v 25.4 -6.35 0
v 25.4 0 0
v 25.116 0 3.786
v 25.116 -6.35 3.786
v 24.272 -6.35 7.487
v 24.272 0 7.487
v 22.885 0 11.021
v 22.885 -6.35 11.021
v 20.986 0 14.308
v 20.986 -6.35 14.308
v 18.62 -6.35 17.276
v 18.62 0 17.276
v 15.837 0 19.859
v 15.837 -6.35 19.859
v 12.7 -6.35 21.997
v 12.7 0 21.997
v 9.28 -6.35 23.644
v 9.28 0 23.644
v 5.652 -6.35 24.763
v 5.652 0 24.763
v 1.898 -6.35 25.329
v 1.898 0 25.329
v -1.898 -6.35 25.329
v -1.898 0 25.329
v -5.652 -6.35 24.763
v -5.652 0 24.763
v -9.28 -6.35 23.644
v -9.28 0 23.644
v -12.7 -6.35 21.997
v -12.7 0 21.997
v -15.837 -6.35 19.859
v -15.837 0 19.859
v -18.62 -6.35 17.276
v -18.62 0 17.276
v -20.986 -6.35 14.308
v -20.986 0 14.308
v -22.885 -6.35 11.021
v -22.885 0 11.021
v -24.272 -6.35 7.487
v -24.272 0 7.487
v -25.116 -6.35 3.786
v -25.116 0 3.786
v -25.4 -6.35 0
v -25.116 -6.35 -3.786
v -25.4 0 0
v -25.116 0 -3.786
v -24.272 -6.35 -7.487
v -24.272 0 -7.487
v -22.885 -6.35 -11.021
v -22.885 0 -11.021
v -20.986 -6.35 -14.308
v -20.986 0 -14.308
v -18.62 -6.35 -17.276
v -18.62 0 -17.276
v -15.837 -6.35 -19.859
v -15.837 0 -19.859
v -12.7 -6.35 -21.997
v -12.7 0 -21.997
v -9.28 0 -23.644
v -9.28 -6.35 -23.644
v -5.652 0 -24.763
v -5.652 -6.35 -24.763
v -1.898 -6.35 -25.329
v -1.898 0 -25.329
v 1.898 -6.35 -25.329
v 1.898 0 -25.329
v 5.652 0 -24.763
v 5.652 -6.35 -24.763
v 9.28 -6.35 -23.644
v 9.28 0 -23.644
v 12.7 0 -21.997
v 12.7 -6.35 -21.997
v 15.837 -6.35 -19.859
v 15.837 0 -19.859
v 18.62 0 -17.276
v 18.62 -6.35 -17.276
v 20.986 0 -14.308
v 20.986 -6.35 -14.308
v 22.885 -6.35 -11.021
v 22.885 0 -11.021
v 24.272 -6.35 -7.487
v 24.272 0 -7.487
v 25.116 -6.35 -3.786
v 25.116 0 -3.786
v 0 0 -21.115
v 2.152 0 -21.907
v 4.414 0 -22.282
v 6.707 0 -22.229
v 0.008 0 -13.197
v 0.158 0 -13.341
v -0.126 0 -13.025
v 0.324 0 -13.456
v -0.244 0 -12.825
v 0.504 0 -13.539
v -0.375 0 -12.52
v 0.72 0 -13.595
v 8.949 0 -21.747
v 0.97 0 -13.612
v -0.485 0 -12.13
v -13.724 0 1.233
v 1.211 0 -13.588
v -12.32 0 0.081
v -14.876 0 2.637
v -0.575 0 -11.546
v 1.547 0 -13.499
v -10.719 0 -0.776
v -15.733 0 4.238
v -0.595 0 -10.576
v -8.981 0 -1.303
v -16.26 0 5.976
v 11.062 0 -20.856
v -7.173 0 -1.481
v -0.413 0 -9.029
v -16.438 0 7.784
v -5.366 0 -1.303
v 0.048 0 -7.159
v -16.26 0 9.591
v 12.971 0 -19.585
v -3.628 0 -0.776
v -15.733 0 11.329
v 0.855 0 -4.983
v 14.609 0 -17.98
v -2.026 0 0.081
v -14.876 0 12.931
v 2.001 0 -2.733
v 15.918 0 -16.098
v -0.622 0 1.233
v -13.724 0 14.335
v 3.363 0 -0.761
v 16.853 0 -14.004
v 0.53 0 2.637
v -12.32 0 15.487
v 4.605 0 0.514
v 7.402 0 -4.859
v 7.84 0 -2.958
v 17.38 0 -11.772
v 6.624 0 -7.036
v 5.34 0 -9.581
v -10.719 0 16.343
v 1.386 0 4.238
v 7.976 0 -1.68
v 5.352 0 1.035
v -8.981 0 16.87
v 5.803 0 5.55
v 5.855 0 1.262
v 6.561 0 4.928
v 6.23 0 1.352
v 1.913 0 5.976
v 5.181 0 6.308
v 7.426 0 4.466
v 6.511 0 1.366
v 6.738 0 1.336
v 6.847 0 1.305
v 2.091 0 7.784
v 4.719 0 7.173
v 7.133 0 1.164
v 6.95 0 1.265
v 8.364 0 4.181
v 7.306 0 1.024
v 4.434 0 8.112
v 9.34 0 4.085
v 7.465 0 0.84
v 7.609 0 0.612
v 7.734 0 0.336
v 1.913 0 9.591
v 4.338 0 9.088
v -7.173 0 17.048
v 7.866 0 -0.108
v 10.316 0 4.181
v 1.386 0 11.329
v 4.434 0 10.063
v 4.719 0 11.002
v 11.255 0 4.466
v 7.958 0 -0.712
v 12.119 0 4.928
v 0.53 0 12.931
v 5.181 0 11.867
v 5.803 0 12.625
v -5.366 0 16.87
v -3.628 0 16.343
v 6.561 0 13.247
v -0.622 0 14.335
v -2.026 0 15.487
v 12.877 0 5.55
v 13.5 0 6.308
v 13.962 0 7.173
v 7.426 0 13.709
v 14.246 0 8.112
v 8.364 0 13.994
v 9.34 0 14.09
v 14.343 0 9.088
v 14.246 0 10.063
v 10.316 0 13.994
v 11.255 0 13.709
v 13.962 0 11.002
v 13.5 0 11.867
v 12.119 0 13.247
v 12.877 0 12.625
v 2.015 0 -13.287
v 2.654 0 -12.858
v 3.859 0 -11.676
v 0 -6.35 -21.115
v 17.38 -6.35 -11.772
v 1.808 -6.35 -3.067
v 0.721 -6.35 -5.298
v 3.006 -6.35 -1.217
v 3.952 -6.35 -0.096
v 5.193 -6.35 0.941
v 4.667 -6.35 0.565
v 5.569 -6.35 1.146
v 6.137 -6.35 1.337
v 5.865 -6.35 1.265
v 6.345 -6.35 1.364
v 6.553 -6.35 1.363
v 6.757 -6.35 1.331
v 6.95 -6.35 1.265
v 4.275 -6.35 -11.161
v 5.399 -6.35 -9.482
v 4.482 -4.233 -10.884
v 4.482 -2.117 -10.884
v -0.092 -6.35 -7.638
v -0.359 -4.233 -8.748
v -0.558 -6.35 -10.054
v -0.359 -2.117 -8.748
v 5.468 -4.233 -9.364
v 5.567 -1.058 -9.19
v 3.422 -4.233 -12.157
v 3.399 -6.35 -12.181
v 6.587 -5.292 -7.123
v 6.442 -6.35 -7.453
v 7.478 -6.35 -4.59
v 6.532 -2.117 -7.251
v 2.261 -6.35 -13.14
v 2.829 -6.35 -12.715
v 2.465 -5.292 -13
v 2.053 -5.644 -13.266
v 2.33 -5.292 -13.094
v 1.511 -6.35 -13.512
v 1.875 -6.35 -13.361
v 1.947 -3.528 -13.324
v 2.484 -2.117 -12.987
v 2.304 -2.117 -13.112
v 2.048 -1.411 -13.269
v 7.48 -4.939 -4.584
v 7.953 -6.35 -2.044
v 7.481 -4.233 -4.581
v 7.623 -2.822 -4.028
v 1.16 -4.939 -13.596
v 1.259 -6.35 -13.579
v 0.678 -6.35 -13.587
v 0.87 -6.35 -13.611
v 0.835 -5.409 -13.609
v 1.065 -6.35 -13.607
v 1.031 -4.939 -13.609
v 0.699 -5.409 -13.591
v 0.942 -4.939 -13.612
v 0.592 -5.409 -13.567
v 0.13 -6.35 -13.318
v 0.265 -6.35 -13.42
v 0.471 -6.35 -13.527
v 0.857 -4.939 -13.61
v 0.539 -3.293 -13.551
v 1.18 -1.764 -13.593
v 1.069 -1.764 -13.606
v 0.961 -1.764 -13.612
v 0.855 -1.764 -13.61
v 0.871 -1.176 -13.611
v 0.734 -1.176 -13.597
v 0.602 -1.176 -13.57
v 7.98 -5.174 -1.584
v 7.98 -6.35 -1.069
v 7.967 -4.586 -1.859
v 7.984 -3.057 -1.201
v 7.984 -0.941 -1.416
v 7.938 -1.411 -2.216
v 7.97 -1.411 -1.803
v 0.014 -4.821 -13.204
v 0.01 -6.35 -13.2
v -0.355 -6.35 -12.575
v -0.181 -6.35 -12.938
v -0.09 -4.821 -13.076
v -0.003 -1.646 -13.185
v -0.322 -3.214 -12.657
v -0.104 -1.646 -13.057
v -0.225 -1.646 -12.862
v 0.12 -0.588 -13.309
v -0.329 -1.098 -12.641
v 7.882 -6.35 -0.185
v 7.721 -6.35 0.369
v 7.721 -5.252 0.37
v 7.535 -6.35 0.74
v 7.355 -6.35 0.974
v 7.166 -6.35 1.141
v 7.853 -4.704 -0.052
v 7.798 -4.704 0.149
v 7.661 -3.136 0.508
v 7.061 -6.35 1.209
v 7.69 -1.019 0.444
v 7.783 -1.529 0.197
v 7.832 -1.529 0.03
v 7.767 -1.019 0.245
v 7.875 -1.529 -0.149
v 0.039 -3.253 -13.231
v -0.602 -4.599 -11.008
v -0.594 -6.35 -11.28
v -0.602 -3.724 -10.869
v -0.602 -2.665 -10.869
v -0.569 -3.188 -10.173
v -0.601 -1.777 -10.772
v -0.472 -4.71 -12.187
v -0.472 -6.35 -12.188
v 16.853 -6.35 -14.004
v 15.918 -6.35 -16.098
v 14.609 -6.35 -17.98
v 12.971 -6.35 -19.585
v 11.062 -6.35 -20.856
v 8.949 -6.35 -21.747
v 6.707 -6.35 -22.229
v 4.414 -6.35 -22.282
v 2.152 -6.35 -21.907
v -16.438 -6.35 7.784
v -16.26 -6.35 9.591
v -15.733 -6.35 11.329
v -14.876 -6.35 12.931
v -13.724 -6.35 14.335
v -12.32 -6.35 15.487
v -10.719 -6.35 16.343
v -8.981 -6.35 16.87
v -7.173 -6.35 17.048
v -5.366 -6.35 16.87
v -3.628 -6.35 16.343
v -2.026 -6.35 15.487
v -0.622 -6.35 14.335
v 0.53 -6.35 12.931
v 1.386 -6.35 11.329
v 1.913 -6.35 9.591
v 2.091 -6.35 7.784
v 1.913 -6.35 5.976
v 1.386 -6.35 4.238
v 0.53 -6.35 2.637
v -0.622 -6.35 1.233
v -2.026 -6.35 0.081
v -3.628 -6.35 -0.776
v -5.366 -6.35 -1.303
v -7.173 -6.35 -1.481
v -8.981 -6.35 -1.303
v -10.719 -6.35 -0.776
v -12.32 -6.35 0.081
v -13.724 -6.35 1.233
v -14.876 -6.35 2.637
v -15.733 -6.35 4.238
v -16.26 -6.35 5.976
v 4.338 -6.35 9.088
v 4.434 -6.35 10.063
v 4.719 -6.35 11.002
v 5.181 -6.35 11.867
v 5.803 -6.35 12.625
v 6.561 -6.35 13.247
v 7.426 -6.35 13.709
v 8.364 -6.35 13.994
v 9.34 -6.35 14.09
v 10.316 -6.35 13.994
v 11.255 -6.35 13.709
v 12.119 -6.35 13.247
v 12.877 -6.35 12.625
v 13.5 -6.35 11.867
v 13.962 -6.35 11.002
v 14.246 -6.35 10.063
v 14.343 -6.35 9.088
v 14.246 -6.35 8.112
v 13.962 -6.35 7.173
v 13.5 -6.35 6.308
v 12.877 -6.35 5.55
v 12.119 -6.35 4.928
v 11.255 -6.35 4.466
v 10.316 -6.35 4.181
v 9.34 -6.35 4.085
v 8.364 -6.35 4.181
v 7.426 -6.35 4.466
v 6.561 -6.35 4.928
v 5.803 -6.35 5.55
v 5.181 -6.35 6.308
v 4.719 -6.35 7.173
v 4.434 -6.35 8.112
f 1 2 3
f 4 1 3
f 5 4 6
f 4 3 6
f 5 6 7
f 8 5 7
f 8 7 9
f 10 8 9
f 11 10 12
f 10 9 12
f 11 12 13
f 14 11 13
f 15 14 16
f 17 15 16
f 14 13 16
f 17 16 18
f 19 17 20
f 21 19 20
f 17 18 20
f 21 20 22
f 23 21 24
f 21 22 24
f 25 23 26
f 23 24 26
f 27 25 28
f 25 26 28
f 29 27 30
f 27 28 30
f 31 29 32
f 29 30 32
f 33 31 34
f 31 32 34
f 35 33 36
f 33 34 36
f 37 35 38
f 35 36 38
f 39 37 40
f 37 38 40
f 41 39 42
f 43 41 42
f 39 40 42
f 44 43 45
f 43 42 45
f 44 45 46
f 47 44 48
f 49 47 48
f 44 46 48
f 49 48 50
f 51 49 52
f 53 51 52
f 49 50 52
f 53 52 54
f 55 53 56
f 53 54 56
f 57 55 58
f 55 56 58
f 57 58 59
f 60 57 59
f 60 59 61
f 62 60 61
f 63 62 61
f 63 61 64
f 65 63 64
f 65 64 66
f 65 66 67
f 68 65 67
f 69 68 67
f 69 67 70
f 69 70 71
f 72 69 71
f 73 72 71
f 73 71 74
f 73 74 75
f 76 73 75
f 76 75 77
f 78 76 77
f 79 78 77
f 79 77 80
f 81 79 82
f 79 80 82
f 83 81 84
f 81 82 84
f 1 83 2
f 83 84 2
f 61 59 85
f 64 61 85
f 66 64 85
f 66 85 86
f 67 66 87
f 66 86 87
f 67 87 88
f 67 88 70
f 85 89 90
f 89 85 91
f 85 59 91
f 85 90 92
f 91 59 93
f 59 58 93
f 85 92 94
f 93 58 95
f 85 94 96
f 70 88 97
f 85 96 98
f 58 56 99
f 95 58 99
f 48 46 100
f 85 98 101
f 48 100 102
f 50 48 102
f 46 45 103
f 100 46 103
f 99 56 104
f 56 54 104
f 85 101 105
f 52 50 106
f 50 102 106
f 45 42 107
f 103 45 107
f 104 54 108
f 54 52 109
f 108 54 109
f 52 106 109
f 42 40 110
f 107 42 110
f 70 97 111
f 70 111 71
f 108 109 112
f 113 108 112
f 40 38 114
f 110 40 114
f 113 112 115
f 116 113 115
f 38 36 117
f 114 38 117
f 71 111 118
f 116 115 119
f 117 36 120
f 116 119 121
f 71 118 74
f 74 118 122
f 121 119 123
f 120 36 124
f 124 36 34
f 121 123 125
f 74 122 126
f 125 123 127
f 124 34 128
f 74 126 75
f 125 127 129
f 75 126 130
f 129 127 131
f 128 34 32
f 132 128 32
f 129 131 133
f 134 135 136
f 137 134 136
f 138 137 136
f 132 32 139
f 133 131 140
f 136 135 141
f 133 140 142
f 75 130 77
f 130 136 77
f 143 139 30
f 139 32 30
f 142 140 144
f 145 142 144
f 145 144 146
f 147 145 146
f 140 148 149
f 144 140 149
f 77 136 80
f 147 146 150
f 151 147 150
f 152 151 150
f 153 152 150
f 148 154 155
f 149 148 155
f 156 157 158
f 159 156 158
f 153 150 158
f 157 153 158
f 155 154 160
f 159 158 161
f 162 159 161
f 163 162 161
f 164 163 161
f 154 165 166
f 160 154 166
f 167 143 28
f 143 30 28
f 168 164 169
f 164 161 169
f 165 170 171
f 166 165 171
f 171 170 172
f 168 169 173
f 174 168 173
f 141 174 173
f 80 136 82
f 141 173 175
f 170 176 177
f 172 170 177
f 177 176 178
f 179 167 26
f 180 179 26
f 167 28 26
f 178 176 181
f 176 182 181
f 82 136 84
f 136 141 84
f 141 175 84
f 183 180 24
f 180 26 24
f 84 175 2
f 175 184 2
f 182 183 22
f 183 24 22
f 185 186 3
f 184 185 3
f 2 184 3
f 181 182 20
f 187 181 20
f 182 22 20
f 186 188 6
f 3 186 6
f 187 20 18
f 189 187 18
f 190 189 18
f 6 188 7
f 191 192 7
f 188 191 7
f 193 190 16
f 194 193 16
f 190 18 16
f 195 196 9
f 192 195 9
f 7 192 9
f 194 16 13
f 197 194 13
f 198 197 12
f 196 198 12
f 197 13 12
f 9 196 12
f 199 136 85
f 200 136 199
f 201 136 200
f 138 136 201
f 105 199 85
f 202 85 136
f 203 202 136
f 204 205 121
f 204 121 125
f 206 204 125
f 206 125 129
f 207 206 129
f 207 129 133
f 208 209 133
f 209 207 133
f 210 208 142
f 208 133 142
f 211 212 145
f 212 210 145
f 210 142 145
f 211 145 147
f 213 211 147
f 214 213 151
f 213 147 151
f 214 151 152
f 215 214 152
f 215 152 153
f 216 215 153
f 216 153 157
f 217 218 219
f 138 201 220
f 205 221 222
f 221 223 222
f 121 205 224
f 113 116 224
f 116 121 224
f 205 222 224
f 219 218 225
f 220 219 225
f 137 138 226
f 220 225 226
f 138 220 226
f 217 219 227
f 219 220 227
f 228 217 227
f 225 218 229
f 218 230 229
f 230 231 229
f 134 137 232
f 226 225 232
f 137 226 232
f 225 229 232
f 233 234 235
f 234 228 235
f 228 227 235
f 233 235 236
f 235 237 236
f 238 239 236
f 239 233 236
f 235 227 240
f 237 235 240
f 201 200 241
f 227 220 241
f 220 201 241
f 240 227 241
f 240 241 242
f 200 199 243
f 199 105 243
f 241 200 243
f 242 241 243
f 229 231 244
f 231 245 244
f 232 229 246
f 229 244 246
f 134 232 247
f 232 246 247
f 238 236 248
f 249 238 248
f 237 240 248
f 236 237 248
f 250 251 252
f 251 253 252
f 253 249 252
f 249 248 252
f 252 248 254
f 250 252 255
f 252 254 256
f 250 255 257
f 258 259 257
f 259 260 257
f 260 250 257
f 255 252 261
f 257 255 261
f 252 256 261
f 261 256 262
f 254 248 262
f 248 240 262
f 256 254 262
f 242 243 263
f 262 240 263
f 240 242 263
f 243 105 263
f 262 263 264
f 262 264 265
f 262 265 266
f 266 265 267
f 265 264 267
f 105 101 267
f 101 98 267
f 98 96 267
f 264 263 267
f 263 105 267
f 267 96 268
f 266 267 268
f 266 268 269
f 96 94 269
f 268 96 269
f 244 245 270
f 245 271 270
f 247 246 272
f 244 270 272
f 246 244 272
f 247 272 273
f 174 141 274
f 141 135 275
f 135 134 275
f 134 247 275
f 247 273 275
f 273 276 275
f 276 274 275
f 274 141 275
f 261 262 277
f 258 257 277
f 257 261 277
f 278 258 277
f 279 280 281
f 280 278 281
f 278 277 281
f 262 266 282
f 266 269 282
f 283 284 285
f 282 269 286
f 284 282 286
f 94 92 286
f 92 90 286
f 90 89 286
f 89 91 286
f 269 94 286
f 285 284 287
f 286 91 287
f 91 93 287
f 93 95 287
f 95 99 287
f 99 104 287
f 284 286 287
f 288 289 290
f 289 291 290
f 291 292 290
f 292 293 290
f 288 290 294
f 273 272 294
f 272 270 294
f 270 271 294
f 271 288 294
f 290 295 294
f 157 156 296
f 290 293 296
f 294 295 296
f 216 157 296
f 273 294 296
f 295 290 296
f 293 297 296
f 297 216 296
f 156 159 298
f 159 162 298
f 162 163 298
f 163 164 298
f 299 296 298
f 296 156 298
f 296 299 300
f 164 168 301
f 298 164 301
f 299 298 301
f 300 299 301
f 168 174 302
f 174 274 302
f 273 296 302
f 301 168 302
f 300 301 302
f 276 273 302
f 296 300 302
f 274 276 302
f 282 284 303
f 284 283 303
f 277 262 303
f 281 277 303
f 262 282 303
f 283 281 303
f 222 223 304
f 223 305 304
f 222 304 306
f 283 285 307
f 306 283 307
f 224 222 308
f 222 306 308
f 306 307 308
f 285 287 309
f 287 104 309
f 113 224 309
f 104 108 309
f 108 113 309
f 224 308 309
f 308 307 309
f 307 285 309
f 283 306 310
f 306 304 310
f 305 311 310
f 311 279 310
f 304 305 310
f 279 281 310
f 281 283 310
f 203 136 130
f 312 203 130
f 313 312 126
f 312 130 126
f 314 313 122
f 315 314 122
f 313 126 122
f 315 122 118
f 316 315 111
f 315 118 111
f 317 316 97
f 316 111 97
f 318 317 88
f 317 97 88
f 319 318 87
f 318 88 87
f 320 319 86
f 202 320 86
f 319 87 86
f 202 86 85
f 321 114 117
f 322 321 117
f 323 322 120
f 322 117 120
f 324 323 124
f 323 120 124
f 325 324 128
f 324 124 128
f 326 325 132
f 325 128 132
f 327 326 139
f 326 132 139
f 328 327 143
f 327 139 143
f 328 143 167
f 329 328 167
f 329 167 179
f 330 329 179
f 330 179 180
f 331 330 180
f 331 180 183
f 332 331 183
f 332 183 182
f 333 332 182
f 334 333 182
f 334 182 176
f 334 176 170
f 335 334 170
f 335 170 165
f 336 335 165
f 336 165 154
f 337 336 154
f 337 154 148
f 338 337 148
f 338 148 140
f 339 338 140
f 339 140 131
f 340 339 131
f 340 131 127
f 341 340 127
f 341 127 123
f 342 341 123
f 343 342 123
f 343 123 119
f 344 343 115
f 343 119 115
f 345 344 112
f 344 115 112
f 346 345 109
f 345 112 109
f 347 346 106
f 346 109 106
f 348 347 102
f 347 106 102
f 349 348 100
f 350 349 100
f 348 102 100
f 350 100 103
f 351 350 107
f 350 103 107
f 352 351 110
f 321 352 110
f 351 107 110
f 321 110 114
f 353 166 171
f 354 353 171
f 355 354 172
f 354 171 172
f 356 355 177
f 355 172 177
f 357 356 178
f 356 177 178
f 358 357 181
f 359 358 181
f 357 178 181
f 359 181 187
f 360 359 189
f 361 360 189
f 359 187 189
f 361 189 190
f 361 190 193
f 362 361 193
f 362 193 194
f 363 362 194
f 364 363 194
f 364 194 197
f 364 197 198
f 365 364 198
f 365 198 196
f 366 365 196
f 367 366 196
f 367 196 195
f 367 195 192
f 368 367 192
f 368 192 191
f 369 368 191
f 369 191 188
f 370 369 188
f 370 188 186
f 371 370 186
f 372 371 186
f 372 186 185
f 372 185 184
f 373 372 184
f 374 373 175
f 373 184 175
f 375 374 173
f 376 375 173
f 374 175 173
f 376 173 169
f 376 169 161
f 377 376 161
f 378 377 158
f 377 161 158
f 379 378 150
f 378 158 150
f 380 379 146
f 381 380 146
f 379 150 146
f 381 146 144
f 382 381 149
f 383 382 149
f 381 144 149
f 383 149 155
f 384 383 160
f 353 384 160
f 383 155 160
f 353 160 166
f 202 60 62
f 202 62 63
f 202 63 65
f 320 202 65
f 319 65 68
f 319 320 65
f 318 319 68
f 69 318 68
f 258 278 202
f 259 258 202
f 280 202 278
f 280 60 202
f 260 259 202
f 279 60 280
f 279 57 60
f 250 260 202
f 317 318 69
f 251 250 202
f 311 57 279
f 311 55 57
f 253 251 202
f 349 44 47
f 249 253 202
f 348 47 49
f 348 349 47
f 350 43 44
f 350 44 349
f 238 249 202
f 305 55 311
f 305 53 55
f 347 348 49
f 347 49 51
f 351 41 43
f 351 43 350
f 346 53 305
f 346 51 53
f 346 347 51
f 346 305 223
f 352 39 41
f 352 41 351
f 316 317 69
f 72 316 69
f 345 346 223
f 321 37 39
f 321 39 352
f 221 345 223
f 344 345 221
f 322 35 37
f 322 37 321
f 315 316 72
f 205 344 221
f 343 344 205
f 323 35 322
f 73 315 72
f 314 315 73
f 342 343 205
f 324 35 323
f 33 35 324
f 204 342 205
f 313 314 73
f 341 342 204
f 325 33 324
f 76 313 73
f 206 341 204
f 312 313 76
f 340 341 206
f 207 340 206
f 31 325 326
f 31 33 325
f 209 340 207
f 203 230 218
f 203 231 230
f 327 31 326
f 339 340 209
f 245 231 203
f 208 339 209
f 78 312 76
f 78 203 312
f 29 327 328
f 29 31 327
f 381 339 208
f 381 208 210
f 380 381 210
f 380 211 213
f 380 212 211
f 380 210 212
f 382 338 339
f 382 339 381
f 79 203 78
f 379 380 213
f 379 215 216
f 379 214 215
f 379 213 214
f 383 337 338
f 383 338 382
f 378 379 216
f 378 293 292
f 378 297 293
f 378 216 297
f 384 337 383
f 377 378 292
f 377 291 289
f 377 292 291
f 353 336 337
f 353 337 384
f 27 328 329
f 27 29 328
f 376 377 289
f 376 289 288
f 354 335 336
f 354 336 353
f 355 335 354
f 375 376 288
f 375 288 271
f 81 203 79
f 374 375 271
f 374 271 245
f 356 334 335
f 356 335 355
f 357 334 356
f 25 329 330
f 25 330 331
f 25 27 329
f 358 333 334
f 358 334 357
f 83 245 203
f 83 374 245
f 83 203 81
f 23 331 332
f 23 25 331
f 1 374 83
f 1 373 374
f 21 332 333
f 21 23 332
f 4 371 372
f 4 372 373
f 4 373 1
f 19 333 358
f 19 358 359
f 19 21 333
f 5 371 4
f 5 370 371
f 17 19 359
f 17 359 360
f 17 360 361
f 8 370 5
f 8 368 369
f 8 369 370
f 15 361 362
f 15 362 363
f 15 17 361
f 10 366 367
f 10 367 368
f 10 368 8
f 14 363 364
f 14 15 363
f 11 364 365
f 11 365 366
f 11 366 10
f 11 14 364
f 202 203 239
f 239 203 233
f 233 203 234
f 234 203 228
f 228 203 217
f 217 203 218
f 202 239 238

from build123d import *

# Parameters (mm, degrees)
F0_R     = 25.4
F1_DEPTH = 6.35
F2_R     = 5.0022521094
F2_R_2   = 9.2645571297
F3_DEPTH = 304.8


with BuildPart() as f1:
    # F0 (on Front) → F1 (new body)
    with BuildSketch(Plane.XZ):
        Circle(F0_R)
    extrude(amount=F1_DEPTH)

    # F2 (on face) → F3 (cut)
    with BuildSketch(Plane(origin=(0, 0, 0), x_dir=(-1, 0, 0), z_dir=(0, 1, 0))):
        with Locations((-9.3403114006, 9.0875271708)):
            Circle(F2_R)
        with Locations((7.1732723154, 7.7838213183)):
            Circle(F2_R_2)
        with BuildLine():
            add(Edge.make_bspline(
                [(-6.9501879625, 1.2653029989), (-11.791334102, -0.8704968986), (-4.4818707212, -10.8840809798), (2.8275926597, -20.8976650611), (0.3592754184, -8.7482810823), (-2.109041823, 3.4011028965), (-6.9501879625, 1.2653029989)],
                knots=[0, 0, 0, 2.0943951024, 2.0943951024, 4.1887902048, 4.1887902048, 6.2831853072, 6.2831853072, 6.2831853072], degree=2, weights=[1, 0.5, 1, 0.5, 1, 0.5, 1]))
        make_face()
        with BuildLine():
            Line((0, -21.1149472743), (-17.3798184842, -11.7717366666))
            ThreePointArc((-17.3798184842, -11.7717366666), (-11.0620797857, -20.8559465014), (0, -21.1149472743))
        make_face()
    extrude(amount=-F3_DEPTH, mode=Mode.SUBTRACT)


solid = f1.part
